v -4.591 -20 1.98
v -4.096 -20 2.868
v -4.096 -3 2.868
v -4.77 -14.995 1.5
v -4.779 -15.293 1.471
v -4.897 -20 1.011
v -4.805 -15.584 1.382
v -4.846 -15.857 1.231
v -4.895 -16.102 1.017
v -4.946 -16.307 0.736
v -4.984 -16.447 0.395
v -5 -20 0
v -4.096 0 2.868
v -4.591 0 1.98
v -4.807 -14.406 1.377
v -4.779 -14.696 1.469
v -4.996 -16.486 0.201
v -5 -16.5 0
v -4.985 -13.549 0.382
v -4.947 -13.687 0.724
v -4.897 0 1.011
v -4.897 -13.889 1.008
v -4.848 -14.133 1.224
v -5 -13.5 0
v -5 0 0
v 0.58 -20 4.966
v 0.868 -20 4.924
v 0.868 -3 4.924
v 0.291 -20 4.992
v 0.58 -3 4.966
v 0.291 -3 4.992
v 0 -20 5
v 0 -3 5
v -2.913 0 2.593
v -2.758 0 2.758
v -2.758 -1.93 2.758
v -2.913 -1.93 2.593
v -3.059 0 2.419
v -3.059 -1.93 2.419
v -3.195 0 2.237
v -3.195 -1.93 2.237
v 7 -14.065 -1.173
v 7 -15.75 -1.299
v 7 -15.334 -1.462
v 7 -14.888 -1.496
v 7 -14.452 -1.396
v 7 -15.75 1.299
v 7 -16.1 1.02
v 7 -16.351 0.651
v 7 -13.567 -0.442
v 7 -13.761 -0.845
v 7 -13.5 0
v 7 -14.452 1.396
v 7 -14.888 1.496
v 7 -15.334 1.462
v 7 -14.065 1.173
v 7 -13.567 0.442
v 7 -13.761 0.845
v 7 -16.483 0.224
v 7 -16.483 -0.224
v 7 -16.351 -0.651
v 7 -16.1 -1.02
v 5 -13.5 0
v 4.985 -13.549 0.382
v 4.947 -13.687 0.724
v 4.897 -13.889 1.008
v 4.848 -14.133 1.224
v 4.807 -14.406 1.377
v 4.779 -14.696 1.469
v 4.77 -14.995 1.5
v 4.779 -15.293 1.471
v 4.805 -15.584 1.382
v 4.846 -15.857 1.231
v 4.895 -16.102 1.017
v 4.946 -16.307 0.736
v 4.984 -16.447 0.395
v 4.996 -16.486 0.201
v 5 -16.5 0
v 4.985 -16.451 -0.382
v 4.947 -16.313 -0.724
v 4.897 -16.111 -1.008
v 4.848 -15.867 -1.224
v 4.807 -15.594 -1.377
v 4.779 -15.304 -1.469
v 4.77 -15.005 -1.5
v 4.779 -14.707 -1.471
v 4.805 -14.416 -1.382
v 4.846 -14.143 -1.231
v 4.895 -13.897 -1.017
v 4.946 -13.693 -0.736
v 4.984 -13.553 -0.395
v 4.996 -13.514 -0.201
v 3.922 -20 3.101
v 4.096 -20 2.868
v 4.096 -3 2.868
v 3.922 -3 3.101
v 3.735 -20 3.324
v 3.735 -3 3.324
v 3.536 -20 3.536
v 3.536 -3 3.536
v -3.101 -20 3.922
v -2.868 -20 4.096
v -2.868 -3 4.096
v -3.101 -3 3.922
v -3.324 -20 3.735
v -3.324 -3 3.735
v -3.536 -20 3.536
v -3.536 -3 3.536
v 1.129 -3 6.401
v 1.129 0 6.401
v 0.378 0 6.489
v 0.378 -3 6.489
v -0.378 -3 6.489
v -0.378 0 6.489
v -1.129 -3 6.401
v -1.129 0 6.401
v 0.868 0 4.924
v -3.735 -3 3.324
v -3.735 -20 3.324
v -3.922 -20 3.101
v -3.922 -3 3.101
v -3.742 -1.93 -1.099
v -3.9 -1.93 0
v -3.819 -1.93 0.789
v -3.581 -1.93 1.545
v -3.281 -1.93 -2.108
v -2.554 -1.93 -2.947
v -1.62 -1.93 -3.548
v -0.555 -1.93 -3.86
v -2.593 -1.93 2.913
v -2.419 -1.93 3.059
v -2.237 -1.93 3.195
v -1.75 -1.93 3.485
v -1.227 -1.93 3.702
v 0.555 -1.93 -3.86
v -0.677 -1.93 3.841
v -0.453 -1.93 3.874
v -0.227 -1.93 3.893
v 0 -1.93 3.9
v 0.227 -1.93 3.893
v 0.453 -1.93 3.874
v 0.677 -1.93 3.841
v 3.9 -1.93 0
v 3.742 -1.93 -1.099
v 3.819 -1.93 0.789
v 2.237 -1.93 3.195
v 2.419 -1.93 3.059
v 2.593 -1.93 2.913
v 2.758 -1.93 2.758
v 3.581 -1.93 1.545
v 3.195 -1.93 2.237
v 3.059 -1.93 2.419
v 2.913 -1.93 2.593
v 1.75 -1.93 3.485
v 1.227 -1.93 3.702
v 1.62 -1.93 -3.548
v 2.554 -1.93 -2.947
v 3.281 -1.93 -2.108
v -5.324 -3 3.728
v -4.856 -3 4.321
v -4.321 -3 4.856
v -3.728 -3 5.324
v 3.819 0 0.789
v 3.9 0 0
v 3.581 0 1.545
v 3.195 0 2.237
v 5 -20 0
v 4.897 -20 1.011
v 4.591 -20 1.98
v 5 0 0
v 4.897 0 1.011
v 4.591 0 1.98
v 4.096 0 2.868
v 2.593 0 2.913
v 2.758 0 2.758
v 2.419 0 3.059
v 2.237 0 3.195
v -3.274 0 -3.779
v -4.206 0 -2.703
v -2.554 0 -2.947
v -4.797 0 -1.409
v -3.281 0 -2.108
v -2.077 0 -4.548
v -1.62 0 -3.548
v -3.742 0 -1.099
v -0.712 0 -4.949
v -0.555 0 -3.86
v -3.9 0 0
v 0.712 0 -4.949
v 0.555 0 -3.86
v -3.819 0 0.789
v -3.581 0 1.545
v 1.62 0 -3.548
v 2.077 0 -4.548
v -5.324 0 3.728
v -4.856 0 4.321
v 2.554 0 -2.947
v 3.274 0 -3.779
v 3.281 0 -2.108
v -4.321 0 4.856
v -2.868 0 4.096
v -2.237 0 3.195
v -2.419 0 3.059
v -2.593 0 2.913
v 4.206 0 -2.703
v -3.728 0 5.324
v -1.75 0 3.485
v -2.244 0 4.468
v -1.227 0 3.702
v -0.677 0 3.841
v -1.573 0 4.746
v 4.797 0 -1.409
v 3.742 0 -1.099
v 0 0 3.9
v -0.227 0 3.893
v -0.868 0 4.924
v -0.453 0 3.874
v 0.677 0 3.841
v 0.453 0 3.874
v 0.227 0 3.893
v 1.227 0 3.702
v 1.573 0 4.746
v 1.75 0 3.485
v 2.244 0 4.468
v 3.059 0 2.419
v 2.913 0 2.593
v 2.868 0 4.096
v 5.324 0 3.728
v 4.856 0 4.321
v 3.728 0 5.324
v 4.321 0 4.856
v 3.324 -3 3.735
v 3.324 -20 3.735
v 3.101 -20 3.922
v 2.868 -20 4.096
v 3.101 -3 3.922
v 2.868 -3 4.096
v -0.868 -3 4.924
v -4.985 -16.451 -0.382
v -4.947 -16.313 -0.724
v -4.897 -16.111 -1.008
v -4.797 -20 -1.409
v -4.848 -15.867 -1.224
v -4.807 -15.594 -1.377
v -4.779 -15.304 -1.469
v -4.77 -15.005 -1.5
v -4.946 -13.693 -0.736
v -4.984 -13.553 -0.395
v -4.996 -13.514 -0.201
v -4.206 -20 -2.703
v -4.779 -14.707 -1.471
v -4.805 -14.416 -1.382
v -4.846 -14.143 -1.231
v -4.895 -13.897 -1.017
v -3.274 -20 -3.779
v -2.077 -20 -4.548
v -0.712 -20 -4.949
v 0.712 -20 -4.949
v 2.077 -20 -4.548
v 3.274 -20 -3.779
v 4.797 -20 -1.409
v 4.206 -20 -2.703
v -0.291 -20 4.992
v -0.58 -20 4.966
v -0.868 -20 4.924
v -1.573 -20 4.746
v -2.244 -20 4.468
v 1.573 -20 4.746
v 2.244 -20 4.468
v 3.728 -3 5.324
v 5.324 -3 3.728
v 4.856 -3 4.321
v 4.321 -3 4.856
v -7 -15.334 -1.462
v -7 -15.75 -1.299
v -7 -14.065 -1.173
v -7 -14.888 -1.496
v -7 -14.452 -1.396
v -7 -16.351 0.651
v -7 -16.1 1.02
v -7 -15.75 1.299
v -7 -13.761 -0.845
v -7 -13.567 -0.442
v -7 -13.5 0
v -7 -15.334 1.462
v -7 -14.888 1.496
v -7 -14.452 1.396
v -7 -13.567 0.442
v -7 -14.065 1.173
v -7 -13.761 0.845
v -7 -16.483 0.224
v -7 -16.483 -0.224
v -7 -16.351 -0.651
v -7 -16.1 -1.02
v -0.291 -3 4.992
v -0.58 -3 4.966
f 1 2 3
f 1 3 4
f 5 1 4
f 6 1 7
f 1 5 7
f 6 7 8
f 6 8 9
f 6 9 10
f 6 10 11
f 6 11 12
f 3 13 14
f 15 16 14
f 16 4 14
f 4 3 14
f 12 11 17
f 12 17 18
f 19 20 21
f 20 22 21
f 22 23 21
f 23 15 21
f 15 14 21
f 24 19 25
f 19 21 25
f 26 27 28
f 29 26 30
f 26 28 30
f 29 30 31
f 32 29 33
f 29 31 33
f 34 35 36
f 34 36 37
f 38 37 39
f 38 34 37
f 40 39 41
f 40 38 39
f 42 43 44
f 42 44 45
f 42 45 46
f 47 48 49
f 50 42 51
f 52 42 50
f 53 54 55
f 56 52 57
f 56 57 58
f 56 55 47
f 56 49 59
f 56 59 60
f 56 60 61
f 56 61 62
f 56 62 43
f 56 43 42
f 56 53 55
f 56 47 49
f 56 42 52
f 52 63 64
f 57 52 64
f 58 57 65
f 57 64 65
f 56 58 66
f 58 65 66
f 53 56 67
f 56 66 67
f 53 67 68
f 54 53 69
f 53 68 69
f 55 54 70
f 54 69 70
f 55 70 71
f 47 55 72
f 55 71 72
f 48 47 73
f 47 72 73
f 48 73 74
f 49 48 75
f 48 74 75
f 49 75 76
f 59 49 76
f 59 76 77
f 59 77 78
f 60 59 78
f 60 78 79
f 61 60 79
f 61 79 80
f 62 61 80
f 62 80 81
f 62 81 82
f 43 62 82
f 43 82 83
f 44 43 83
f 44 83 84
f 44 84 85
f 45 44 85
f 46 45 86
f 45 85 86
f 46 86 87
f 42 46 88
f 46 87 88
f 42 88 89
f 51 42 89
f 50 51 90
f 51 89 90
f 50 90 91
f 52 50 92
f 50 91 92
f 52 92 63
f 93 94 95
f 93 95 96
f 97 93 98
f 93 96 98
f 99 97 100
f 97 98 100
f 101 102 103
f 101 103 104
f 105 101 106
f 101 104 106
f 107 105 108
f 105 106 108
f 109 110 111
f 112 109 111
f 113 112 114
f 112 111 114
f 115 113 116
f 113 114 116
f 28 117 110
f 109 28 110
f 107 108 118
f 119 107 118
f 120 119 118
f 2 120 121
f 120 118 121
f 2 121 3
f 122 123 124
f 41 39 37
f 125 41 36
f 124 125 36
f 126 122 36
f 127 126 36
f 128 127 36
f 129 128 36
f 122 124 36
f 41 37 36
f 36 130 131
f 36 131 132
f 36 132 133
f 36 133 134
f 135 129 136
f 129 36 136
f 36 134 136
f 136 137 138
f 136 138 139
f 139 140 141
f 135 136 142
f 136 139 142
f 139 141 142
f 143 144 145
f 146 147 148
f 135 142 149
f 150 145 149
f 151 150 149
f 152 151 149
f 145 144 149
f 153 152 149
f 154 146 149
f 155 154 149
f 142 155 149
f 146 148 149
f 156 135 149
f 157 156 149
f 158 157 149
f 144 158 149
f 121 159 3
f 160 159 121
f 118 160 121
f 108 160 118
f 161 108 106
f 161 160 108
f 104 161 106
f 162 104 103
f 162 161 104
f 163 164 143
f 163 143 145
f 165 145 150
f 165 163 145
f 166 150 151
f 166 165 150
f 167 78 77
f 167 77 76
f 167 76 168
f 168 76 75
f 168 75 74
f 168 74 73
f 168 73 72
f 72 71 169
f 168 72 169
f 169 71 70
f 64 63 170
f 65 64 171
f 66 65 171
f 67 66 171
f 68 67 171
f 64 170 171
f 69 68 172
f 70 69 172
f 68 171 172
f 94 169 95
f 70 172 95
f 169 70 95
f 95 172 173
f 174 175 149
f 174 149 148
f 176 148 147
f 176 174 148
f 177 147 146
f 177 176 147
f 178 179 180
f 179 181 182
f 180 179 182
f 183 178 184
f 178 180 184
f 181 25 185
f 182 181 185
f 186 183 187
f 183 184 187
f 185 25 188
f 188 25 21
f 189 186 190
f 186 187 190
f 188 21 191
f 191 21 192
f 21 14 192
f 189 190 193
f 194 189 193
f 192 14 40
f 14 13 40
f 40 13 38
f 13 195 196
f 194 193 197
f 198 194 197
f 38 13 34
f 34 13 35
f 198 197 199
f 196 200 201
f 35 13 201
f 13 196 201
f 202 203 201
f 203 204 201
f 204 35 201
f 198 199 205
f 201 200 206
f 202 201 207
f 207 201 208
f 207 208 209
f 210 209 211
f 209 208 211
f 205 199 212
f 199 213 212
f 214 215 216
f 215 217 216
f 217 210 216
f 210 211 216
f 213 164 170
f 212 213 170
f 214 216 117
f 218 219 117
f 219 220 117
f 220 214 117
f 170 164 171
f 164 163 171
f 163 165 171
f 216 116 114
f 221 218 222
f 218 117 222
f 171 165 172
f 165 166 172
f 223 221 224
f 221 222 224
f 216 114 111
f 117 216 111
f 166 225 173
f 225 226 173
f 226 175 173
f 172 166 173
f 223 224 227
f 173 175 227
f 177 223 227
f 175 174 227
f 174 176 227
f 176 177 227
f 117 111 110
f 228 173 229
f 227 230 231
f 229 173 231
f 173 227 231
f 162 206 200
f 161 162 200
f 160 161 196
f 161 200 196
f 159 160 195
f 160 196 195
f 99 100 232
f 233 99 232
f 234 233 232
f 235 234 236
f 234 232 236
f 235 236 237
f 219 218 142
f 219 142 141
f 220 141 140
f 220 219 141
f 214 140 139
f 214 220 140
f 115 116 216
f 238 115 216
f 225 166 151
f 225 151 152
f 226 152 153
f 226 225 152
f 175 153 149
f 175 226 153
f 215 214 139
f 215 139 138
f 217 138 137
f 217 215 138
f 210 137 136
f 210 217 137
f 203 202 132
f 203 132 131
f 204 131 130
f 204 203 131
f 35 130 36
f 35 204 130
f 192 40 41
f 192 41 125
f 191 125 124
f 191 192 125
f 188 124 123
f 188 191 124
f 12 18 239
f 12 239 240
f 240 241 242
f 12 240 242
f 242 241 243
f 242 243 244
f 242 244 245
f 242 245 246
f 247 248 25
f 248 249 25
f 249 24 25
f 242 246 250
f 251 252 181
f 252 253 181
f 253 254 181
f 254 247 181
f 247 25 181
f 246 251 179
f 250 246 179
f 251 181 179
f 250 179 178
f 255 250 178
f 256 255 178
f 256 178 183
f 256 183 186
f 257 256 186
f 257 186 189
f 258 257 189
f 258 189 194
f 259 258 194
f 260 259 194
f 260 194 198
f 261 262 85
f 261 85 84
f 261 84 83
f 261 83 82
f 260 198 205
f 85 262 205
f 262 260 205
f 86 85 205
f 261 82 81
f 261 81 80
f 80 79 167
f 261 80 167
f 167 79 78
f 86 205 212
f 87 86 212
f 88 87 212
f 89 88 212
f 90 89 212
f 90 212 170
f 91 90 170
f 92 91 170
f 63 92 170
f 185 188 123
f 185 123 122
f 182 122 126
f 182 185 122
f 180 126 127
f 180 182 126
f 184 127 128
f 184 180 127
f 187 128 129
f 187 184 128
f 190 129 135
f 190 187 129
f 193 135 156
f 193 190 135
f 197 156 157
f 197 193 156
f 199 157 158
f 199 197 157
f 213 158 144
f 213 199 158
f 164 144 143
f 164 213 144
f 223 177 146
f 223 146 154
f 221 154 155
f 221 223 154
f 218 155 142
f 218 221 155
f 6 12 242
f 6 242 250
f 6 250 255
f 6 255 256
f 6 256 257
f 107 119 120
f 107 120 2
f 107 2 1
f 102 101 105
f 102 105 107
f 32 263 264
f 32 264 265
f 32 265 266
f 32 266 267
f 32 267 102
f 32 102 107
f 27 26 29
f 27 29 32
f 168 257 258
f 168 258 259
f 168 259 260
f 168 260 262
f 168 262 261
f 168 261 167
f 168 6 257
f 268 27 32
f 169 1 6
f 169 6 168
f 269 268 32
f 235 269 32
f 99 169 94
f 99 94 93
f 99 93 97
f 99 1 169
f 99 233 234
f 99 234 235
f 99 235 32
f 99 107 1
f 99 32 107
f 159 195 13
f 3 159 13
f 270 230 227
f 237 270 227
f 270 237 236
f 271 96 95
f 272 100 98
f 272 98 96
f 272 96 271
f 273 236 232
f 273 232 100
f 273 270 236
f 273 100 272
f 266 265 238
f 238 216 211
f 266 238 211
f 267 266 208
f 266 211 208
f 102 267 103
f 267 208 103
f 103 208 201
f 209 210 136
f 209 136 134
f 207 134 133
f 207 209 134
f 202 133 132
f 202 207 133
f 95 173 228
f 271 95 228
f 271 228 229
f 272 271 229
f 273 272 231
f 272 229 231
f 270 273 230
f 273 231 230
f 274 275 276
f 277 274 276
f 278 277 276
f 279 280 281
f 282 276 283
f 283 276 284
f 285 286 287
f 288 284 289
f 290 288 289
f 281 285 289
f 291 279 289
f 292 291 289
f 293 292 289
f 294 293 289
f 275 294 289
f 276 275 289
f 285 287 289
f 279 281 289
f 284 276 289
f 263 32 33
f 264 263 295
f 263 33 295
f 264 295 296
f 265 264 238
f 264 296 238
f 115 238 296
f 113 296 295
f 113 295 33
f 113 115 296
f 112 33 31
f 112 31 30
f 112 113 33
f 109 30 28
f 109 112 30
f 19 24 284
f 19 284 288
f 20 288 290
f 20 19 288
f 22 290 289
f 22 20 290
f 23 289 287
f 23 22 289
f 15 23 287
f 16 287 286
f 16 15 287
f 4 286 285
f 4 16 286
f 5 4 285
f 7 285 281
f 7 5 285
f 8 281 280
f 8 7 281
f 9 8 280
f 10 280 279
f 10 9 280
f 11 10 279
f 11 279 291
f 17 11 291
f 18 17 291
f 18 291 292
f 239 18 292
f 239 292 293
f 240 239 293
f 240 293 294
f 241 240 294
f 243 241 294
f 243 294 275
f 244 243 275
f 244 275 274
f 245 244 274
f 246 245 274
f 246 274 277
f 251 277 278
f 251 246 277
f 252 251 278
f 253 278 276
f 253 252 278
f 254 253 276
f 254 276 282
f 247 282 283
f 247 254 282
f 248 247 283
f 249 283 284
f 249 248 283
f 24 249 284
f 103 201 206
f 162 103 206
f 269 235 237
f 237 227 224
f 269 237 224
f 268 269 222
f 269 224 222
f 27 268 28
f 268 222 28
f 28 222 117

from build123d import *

# Parameters (mm, degrees)
F1_DEPTH      = 20
F2_DEPTH      = 1.93
F3_DEPTH      = 3
F4_R          = 1.5
F5_DEPTH      = 7
F5_DEPTH_BACK = 7


with BuildPart() as f1:
    # F0 (on Front) → F1 (new body)
    with BuildSketch(Plane.XZ):
        with BuildLine():
            Line((0, 0), (3.9, 0))
            ThreePointArc((3.9, 0), (3.7194961079, 1.1727526181), (3.1946929727, 2.2369481018))
            Line((3.1946929727, 2.2369481018), (0, 0))
        make_face()
        with BuildLine():
            Line((0, 0), (3.1946929727, 2.2369481018))
            ThreePointArc((3.1946929727, 2.2369481018), (2.9875733282, 2.5068716778), (2.7577164466, 2.7577164466))
            Line((2.7577164466, 2.7577164466), (0, 0))
        make_face()
        with BuildLine():
            Line((2.2369481018, 3.1946929727), (0, 0))
            Line((0, 0), (2.7577164466, 2.7577164466))
            ThreePointArc((2.7577164466, 2.7577164466), (2.5068716778, 2.9875733282), (2.2369481018, 3.1946929727))
        make_face()
        with BuildLine():
            Line((0.6772278929, 3.8407502367), (0, 0))
            Line((0, 0), (2.2369481018, 3.1946929727))
            ThreePointArc((2.2369481018, 3.1946929727), (1.4924653862, 3.6031301768), (0.6772278929, 3.8407502367))
        make_face()
        with BuildLine():
            Line((0, 3.9), (0, 0))
            Line((0, 0), (0.6772278929, 3.8407502367))
            ThreePointArc((0.6772278929, 3.8407502367), (0.3399073967, 3.8851593226), (0, 3.9))
        make_face()
        with BuildLine():
            Line((-0.6772278929, 3.8407502367), (0, 0))
            Line((0, 0), (0, 3.9))
            ThreePointArc((0, 3.9), (-0.3399073967, 3.8851593226), (-0.6772278929, 3.8407502367))
        make_face()
        with BuildLine():
            Line((-2.2369481018, 3.1946929727), (0, 0))
            Line((0, 0), (-0.6772278929, 3.8407502367))
            ThreePointArc((-0.6772278929, 3.8407502367), (-1.4924653862, 3.6031301768), (-2.2369481018, 3.1946929727))
        make_face()
        with BuildLine():
            Line((-2.7577164466, 2.7577164466), (0, 0))
            Line((0, 0), (-2.2369481018, 3.1946929727))
            ThreePointArc((-2.2369481018, 3.1946929727), (-2.5068716778, 2.9875733282), (-2.7577164466, 2.7577164466))
        make_face()
        with BuildLine():
            Line((-3.1946929727, 2.2369481018), (0, 0))
            Line((0, 0), (-2.7577164466, 2.7577164466))
            ThreePointArc((-2.7577164466, 2.7577164466), (-2.9875733282, 2.5068716778), (-3.1946929727, 2.2369481018))
        make_face()
        with BuildLine():
            ThreePointArc((-3.1946929727, 2.2369481018), (-3.7194961079, 1.1727526181), (-3.9, 0))
            Line((-3.9, 0), (0, 0))
            Line((0, 0), (-3.1946929727, 2.2369481018))
        make_face()
        with BuildLine():
            ThreePointArc((-3.9, 0), (0, -3.9), (3.9, 0))
            Line((3.9, 0), (0, 0))
            Line((0, 0), (-3.9, 0))
        make_face()
        with BuildLine():
            ThreePointArc((3.1946929727, 2.2369481018), (3.7194961079, 1.1727526181), (3.9, 0))
            Line((3.9, 0), (5, 0))
            ThreePointArc((5, 0), (4.7685847537, 1.5035289975), (4.0957602214, 2.8678821818))
            Line((4.0957602214, 2.8678821818), (3.1946929727, 2.2369481018))
        make_face()
        with BuildLine():
            ThreePointArc((2.7577164466, 2.7577164466), (2.9875733282, 2.5068716778), (3.1946929727, 2.2369481018))
            Line((3.1946929727, 2.2369481018), (4.0957602214, 2.8678821818))
            ThreePointArc((4.0957602214, 2.8678821818), (3.8302222156, 3.2139380484), (3.5355339059, 3.5355339059))
            Line((3.5355339059, 3.5355339059), (2.7577164466, 2.7577164466))
        make_face()
        with BuildLine():
            ThreePointArc((2.2369481018, 3.1946929727), (2.5068716778, 2.9875733282), (2.7577164466, 2.7577164466))
            Line((2.7577164466, 2.7577164466), (3.5355339059, 3.5355339059))
            ThreePointArc((3.5355339059, 3.5355339059), (3.2139380484, 3.8302222156), (2.8678821818, 4.0957602214))
            Line((2.8678821818, 4.0957602214), (2.2369481018, 3.1946929727))
        make_face()
        with BuildLine():
            ThreePointArc((0.6772278929, 3.8407502367), (1.4924653862, 3.6031301768), (2.2369481018, 3.1946929727))
            Line((2.2369481018, 3.1946929727), (2.8678821818, 4.0957602214))
            ThreePointArc((2.8678821818, 4.0957602214), (1.9134171618, 4.6193976626), (0.8682408883, 4.9240387651))
            Line((0.8682408883, 4.9240387651), (0.6772278929, 3.8407502367))
        make_face()
        with BuildLine():
            Line((0, 5), (0, 3.9))
            ThreePointArc((0, 3.9), (0.3399073967, 3.8851593226), (0.6772278929, 3.8407502367))
            Line((0.6772278929, 3.8407502367), (0.8682408883, 4.9240387651))
            ThreePointArc((0.8682408883, 4.9240387651), (0.4357787137, 4.9809734905), (0, 5))
        make_face()
        with BuildLine():
            ThreePointArc((-0.6772278929, 3.8407502367), (-0.3399073967, 3.8851593226), (0, 3.9))
            Line((0, 3.9), (0, 5))
            ThreePointArc((0, 5), (-0.4357787137, 4.9809734905), (-0.8682408883, 4.9240387651))
            Line((-0.8682408883, 4.9240387651), (-0.6772278929, 3.8407502367))
        make_face()
        with BuildLine():
            ThreePointArc((-2.2369481018, 3.1946929727), (-1.4924653862, 3.6031301768), (-0.6772278929, 3.8407502367))
            Line((-0.6772278929, 3.8407502367), (-0.8682408883, 4.9240387651))
            ThreePointArc((-0.8682408883, 4.9240387651), (-1.9134171618, 4.6193976626), (-2.8678821818, 4.0957602214))
            Line((-2.8678821818, 4.0957602214), (-2.2369481018, 3.1946929727))
        make_face()
        with BuildLine():
            Line((-3.5355339059, 3.5355339059), (-2.7577164466, 2.7577164466))
            ThreePointArc((-2.7577164466, 2.7577164466), (-2.5068716778, 2.9875733282), (-2.2369481018, 3.1946929727))
            Line((-2.2369481018, 3.1946929727), (-2.8678821818, 4.0957602214))
            ThreePointArc((-2.8678821818, 4.0957602214), (-3.2139380484, 3.8302222156), (-3.5355339059, 3.5355339059))
        make_face()
        with BuildLine():
            Line((-4.0957602214, 2.8678821818), (-3.1946929727, 2.2369481018))
            ThreePointArc((-3.1946929727, 2.2369481018), (-2.9875733282, 2.5068716778), (-2.7577164466, 2.7577164466))
            Line((-2.7577164466, 2.7577164466), (-3.5355339059, 3.5355339059))
            ThreePointArc((-3.5355339059, 3.5355339059), (-3.8302222156, 3.2139380484), (-4.0957602214, 2.8678821818))
        make_face()
        with BuildLine():
            Line((-5, 0), (-3.9, 0))
            ThreePointArc((-3.9, 0), (-3.7194961079, 1.1727526181), (-3.1946929727, 2.2369481018))
            Line((-3.1946929727, 2.2369481018), (-4.0957602214, 2.8678821818))
            ThreePointArc((-4.0957602214, 2.8678821818), (-4.7685847537, 1.5035289975), (-5, 0))
        make_face()
        with BuildLine():
            Line((5, 0), (3.9, 0))
            ThreePointArc((3.9, 0), (0, -3.9), (-3.9, 0))
            Line((-3.9, 0), (-5, 0))
            ThreePointArc((-5, 0), (0, -5), (5, 0))
        make_face()
    extrude(amount=F1_DEPTH)

    # F0 (on Front) → F2 (cut)
    with BuildSketch(Plane.XZ):
        with BuildLine():
            Line((0, 0), (3.9, 0))
            ThreePointArc((3.9, 0), (3.7194961079, 1.1727526181), (3.1946929727, 2.2369481018))
            Line((3.1946929727, 2.2369481018), (0, 0))
        make_face()
        with BuildLine():
            Line((0, 0), (3.1946929727, 2.2369481018))
            ThreePointArc((3.1946929727, 2.2369481018), (2.9875733282, 2.5068716778), (2.7577164466, 2.7577164466))
            Line((2.7577164466, 2.7577164466), (0, 0))
        make_face()
        with BuildLine():
            Line((2.2369481018, 3.1946929727), (0, 0))
            Line((0, 0), (2.7577164466, 2.7577164466))
            ThreePointArc((2.7577164466, 2.7577164466), (2.5068716778, 2.9875733282), (2.2369481018, 3.1946929727))
        make_face()
        with BuildLine():
            Line((0.6772278929, 3.8407502367), (0, 0))
            Line((0, 0), (2.2369481018, 3.1946929727))
            ThreePointArc((2.2369481018, 3.1946929727), (1.4924653862, 3.6031301768), (0.6772278929, 3.8407502367))
        make_face()
        with BuildLine():
            Line((0, 3.9), (0, 0))
            Line((0, 0), (0.6772278929, 3.8407502367))
            ThreePointArc((0.6772278929, 3.8407502367), (0.3399073967, 3.8851593226), (0, 3.9))
        make_face()
        with BuildLine():
            Line((-0.6772278929, 3.8407502367), (0, 0))
            Line((0, 0), (0, 3.9))
            ThreePointArc((0, 3.9), (-0.3399073967, 3.8851593226), (-0.6772278929, 3.8407502367))
        make_face()
        with BuildLine():
            Line((-2.2369481018, 3.1946929727), (0, 0))
            Line((0, 0), (-0.6772278929, 3.8407502367))
            ThreePointArc((-0.6772278929, 3.8407502367), (-1.4924653862, 3.6031301768), (-2.2369481018, 3.1946929727))
        make_face()
        with BuildLine():
            Line((-2.7577164466, 2.7577164466), (0, 0))
            Line((0, 0), (-2.2369481018, 3.1946929727))
            ThreePointArc((-2.2369481018, 3.1946929727), (-2.5068716778, 2.9875733282), (-2.7577164466, 2.7577164466))
        make_face()
        with BuildLine():
            Line((-3.1946929727, 2.2369481018), (0, 0))
            Line((0, 0), (-2.7577164466, 2.7577164466))
            ThreePointArc((-2.7577164466, 2.7577164466), (-2.9875733282, 2.5068716778), (-3.1946929727, 2.2369481018))
        make_face()
        with BuildLine():
            ThreePointArc((-3.1946929727, 2.2369481018), (-3.7194961079, 1.1727526181), (-3.9, 0))
            Line((-3.9, 0), (0, 0))
            Line((0, 0), (-3.1946929727, 2.2369481018))
        make_face()
        with BuildLine():
            ThreePointArc((-3.9, 0), (0, -3.9), (3.9, 0))
            Line((3.9, 0), (0, 0))
            Line((0, 0), (-3.9, 0))
        make_face()
    extrude(amount=F2_DEPTH, mode=Mode.SUBTRACT)

    # F0 (on Front) → F3 (join)
    with BuildSketch(Plane.XZ):
        with BuildLine():
            ThreePointArc((3.5355339059, 3.5355339059), (3.8302222156, 3.2139380484), (4.0957602214, 2.8678821818))
            Line((4.0957602214, 2.8678821818), (5.3244882879, 3.7282468363))
            ThreePointArc((5.3244882879, 3.7282468363), (4.5961940777, 4.5961940777), (3.7282468363, 5.3244882879))
            Line((3.7282468363, 5.3244882879), (2.8678821818, 4.0957602214))
            ThreePointArc((2.8678821818, 4.0957602214), (3.2139380484, 3.8302222156), (3.5355339059, 3.5355339059))
        make_face()
        with BuildLine():
            ThreePointArc((-0.8682408883, 4.9240387651), (-0.4357787137, 4.9809734905), (0, 5))
            ThreePointArc((0, 5), (0.4357787137, 4.9809734905), (0.8682408883, 4.9240387651))
            Line((0.8682408883, 4.9240387651), (1.1287131548, 6.4012503946))
            ThreePointArc((1.1287131548, 6.4012503946), (0, 6.5), (-1.1287131548, 6.4012503946))
            Line((-1.1287131548, 6.4012503946), (-0.8682408883, 4.9240387651))
        make_face()
        with BuildLine():
            Line((-5.3244882879, 3.7282468363), (-4.0957602214, 2.8678821818))
            ThreePointArc((-4.0957602214, 2.8678821818), (-3.8302222156, 3.2139380484), (-3.5355339059, 3.5355339059))
            ThreePointArc((-3.5355339059, 3.5355339059), (-3.2139380484, 3.8302222156), (-2.8678821818, 4.0957602214))
            Line((-2.8678821818, 4.0957602214), (-3.7282468363, 5.3244882879))
            ThreePointArc((-3.7282468363, 5.3244882879), (-4.5961940777, 4.5961940777), (-5.3244882879, 3.7282468363))
        make_face()
    extrude(amount=F3_DEPTH)

    # F4 (on Right) → F5 (join, two sides)
    with BuildSketch(Plane.YZ) as f5_sk:
        with Locations((-15, 0)):
            Circle(F4_R)
    extrude(amount=F5_DEPTH)
    extrude(f5_sk.sketch, amount=-F5_DEPTH_BACK)


solid = f1.part
